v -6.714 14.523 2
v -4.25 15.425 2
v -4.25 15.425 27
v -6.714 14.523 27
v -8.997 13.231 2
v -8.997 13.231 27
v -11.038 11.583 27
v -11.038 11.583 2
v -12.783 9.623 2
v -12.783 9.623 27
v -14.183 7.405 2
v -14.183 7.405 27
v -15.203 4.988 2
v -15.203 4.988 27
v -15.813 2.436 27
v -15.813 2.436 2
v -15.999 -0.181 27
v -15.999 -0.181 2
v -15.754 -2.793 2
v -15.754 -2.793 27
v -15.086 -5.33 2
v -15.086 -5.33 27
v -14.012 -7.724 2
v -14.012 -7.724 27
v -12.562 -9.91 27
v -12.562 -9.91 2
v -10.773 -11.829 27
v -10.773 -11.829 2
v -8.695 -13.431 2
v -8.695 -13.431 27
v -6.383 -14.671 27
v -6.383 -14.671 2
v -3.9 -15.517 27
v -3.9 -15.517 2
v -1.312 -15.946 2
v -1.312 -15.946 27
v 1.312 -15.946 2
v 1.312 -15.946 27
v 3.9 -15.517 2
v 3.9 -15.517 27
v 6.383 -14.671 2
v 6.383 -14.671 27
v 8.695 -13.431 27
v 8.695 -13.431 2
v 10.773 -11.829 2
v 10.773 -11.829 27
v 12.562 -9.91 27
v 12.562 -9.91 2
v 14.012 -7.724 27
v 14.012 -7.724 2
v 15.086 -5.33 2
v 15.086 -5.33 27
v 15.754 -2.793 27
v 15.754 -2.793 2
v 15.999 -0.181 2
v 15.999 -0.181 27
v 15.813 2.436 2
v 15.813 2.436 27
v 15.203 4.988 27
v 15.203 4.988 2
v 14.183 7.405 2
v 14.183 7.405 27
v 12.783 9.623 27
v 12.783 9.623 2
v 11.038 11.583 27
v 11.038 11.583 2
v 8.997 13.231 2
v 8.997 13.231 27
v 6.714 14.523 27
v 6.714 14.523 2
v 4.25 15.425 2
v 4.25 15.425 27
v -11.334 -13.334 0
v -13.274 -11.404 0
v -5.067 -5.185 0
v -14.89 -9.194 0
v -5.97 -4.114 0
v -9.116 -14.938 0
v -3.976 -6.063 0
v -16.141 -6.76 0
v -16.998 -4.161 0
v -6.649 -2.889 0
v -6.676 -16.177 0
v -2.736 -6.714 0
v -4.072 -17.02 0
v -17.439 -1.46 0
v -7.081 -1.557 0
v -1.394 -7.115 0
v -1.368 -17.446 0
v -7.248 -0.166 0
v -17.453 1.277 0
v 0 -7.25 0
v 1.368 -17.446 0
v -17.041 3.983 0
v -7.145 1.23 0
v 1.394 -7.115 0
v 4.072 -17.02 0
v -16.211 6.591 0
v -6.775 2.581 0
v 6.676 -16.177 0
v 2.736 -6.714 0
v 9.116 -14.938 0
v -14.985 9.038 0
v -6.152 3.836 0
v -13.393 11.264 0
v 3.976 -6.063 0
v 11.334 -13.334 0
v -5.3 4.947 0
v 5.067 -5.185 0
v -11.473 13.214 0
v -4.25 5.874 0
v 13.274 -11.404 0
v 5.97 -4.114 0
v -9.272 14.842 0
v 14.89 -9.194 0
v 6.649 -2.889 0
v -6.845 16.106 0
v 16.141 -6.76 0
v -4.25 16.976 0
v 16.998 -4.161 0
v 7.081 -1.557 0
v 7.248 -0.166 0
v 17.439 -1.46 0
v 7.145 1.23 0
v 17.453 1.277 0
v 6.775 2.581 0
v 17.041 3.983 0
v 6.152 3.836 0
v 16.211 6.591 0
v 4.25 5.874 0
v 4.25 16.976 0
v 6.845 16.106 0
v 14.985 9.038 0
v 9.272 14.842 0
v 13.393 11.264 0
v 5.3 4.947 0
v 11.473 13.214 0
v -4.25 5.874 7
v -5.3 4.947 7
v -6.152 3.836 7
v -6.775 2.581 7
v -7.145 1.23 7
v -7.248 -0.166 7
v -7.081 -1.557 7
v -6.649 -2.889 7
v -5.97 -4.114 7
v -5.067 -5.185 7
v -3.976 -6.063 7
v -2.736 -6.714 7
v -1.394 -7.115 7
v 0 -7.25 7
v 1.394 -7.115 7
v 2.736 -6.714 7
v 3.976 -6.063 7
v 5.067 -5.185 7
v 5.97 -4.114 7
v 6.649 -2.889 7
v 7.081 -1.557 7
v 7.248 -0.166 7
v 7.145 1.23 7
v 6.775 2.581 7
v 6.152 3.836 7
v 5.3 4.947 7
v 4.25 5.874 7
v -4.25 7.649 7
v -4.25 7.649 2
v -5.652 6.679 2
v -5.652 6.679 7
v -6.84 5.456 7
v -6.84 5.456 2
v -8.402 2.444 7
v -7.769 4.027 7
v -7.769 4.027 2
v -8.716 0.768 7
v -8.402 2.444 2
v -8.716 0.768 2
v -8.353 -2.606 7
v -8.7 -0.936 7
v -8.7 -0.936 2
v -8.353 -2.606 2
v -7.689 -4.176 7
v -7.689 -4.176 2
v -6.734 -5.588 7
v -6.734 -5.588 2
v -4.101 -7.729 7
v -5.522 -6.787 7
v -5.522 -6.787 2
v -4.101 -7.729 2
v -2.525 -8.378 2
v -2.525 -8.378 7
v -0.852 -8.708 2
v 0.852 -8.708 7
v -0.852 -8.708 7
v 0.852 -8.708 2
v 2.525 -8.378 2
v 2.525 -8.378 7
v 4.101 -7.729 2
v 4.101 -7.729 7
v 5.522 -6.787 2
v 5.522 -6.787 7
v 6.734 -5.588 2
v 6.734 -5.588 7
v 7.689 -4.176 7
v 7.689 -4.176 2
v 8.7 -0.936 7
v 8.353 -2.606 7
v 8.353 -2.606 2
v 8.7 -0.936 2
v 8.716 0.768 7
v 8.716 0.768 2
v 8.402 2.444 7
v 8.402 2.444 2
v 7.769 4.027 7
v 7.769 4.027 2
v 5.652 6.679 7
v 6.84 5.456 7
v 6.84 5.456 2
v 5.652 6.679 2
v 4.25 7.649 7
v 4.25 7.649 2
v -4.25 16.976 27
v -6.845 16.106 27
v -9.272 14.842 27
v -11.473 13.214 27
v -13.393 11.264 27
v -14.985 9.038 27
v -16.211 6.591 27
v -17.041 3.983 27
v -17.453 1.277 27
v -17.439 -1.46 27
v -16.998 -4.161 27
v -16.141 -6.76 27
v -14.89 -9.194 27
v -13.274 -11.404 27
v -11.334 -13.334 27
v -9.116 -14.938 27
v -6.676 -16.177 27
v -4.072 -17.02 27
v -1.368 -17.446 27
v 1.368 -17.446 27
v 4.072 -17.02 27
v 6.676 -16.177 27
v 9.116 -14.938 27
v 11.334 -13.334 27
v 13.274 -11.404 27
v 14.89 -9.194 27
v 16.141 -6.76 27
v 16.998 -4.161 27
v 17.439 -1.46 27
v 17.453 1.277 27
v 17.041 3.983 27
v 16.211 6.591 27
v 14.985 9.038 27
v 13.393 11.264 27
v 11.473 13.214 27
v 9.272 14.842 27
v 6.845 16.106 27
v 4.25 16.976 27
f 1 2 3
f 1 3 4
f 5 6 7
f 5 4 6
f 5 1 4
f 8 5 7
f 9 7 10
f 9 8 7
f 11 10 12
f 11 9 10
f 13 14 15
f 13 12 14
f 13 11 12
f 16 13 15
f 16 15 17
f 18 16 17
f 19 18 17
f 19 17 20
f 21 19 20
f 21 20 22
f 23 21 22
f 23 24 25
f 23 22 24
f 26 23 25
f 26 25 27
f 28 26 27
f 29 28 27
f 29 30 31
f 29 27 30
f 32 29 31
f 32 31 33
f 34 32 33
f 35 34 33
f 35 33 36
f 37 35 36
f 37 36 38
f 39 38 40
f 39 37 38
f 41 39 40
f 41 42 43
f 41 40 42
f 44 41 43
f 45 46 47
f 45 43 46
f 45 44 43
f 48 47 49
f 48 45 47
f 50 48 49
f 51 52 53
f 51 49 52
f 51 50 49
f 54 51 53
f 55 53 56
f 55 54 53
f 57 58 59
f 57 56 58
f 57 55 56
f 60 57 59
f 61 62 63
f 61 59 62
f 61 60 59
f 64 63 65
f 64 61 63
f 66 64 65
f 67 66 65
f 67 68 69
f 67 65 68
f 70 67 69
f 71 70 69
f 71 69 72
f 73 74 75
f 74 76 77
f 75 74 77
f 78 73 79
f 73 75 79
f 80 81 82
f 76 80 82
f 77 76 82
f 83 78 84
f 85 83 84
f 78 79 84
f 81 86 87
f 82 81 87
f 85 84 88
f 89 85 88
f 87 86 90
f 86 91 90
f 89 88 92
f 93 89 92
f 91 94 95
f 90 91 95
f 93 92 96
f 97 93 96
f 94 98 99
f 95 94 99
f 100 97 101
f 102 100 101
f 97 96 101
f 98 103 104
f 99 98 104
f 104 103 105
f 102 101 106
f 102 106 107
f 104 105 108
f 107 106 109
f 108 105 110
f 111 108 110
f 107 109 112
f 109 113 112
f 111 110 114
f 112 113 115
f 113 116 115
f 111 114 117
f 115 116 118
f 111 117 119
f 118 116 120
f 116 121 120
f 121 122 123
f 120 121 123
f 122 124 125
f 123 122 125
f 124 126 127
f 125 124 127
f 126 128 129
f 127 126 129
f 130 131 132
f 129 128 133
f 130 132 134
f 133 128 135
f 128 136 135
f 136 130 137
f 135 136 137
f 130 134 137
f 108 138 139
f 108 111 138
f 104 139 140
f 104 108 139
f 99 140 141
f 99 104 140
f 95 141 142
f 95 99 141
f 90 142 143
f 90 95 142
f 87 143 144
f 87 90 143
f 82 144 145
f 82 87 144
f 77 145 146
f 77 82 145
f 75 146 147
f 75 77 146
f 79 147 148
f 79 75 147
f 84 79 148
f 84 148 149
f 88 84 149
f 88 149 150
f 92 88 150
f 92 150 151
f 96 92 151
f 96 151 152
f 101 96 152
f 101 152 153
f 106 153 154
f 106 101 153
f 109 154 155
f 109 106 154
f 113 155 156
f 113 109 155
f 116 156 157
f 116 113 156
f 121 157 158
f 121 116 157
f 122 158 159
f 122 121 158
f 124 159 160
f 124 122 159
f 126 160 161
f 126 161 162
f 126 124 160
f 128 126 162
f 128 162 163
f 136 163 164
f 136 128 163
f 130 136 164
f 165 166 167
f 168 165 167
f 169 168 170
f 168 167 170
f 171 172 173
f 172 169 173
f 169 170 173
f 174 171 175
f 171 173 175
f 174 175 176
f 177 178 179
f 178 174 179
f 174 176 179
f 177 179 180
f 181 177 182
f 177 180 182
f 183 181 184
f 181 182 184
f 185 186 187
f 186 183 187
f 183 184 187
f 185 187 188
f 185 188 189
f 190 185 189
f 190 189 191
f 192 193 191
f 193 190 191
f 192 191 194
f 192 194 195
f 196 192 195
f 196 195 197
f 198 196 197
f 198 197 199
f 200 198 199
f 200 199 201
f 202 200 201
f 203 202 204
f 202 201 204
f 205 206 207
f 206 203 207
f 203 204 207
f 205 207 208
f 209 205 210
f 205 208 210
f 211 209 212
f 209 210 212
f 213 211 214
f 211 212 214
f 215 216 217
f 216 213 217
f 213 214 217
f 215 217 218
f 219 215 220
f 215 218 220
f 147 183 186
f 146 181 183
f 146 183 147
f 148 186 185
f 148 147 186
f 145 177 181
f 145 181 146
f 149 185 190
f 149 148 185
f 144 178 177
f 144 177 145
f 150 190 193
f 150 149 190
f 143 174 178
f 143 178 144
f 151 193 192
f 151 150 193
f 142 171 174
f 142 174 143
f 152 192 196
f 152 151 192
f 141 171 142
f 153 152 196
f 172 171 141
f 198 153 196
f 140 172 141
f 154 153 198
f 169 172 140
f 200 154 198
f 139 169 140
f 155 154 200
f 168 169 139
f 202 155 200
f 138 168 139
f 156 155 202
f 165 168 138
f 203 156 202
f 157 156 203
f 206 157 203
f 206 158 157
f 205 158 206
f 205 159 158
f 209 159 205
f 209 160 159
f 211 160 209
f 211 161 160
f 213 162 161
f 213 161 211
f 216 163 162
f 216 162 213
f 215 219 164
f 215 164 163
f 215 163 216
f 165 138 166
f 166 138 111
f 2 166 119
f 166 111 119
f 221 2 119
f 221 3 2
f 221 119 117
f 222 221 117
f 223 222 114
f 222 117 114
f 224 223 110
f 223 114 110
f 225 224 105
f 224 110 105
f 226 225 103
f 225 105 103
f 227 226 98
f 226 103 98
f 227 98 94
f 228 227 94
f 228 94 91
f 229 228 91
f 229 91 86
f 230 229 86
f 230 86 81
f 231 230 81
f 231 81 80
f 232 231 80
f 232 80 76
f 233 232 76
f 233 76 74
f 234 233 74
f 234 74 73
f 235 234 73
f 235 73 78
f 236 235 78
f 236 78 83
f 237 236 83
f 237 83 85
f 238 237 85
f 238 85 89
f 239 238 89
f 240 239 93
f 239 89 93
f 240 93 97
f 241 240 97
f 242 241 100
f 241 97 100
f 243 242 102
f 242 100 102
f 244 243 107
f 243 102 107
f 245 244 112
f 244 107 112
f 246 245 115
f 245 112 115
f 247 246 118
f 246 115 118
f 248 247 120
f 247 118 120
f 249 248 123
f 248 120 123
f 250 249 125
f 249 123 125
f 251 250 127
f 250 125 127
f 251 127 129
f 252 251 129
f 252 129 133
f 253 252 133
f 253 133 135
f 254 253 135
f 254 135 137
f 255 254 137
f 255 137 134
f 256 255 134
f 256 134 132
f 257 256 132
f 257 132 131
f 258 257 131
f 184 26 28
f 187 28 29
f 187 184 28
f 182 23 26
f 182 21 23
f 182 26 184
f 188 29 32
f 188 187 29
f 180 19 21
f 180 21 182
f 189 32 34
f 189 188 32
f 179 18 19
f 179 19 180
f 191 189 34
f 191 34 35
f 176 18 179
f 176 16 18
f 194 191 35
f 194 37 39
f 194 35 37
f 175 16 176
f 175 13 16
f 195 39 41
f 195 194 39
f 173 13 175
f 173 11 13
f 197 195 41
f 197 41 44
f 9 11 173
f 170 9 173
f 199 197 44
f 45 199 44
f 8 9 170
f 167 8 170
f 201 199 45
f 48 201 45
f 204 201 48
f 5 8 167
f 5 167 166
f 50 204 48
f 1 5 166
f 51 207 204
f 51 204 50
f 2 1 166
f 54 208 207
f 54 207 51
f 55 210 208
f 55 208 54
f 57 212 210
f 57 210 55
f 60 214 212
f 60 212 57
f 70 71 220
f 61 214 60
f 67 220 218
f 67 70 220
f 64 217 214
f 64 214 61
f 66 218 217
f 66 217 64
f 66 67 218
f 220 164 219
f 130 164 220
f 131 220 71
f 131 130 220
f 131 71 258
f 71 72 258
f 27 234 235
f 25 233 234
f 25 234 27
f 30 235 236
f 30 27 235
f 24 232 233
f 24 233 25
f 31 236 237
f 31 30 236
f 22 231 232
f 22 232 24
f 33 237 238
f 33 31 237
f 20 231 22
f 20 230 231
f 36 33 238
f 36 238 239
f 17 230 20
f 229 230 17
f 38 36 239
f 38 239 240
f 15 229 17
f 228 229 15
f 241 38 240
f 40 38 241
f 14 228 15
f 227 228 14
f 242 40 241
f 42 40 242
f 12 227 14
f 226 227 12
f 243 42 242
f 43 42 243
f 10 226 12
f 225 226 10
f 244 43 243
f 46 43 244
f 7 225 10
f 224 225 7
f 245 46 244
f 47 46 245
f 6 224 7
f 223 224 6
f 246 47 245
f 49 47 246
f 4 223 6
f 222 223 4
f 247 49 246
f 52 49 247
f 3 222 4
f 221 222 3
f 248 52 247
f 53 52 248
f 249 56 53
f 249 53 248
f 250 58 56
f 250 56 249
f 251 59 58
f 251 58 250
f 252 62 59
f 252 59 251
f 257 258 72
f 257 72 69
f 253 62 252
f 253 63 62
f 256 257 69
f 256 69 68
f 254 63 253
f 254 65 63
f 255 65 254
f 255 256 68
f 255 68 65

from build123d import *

# Parameters (mm, degrees)
F0_R     = 17.5
F0_R_2   = 7.25
F1_DEPTH = 2
F2_R     = 8.75
F2_R_2   = 7.25
F3_DEPTH = 5
F2_R_3   = 17.5
F2_R_4   = 16
F4_DEPTH = 25
F5_W     = 8.5
F5_H     = 17.5
F6_DEPTH = 27.001


with BuildPart() as f1:
    # F0 (on Top) → F1 (new body)
    with BuildSketch(Plane.XY):
        Circle(F0_R)
        Circle(F0_R_2, mode=Mode.SUBTRACT)
    extrude(amount=F1_DEPTH)

    # F2 (on face) → F3 (join)
    with BuildSketch(Plane.XY.offset(2)):
        Circle(F2_R)
        Circle(F2_R_2, mode=Mode.SUBTRACT)
    extrude(amount=F3_DEPTH)

    # F2 (on face) → F4 (join)
    with BuildSketch(Plane.XY.offset(2)):
        Circle(F2_R_3)
        Circle(F2_R_4, mode=Mode.SUBTRACT)
    extrude(amount=F4_DEPTH)

    # F5 (on Top) → F6 (cut, through all)
    with BuildSketch(Plane.XY):
        with Locations((0, 8.75)):
            Rectangle(F5_W, F5_H)
    extrude(amount=F6_DEPTH, mode=Mode.SUBTRACT)


solid = f1.part
